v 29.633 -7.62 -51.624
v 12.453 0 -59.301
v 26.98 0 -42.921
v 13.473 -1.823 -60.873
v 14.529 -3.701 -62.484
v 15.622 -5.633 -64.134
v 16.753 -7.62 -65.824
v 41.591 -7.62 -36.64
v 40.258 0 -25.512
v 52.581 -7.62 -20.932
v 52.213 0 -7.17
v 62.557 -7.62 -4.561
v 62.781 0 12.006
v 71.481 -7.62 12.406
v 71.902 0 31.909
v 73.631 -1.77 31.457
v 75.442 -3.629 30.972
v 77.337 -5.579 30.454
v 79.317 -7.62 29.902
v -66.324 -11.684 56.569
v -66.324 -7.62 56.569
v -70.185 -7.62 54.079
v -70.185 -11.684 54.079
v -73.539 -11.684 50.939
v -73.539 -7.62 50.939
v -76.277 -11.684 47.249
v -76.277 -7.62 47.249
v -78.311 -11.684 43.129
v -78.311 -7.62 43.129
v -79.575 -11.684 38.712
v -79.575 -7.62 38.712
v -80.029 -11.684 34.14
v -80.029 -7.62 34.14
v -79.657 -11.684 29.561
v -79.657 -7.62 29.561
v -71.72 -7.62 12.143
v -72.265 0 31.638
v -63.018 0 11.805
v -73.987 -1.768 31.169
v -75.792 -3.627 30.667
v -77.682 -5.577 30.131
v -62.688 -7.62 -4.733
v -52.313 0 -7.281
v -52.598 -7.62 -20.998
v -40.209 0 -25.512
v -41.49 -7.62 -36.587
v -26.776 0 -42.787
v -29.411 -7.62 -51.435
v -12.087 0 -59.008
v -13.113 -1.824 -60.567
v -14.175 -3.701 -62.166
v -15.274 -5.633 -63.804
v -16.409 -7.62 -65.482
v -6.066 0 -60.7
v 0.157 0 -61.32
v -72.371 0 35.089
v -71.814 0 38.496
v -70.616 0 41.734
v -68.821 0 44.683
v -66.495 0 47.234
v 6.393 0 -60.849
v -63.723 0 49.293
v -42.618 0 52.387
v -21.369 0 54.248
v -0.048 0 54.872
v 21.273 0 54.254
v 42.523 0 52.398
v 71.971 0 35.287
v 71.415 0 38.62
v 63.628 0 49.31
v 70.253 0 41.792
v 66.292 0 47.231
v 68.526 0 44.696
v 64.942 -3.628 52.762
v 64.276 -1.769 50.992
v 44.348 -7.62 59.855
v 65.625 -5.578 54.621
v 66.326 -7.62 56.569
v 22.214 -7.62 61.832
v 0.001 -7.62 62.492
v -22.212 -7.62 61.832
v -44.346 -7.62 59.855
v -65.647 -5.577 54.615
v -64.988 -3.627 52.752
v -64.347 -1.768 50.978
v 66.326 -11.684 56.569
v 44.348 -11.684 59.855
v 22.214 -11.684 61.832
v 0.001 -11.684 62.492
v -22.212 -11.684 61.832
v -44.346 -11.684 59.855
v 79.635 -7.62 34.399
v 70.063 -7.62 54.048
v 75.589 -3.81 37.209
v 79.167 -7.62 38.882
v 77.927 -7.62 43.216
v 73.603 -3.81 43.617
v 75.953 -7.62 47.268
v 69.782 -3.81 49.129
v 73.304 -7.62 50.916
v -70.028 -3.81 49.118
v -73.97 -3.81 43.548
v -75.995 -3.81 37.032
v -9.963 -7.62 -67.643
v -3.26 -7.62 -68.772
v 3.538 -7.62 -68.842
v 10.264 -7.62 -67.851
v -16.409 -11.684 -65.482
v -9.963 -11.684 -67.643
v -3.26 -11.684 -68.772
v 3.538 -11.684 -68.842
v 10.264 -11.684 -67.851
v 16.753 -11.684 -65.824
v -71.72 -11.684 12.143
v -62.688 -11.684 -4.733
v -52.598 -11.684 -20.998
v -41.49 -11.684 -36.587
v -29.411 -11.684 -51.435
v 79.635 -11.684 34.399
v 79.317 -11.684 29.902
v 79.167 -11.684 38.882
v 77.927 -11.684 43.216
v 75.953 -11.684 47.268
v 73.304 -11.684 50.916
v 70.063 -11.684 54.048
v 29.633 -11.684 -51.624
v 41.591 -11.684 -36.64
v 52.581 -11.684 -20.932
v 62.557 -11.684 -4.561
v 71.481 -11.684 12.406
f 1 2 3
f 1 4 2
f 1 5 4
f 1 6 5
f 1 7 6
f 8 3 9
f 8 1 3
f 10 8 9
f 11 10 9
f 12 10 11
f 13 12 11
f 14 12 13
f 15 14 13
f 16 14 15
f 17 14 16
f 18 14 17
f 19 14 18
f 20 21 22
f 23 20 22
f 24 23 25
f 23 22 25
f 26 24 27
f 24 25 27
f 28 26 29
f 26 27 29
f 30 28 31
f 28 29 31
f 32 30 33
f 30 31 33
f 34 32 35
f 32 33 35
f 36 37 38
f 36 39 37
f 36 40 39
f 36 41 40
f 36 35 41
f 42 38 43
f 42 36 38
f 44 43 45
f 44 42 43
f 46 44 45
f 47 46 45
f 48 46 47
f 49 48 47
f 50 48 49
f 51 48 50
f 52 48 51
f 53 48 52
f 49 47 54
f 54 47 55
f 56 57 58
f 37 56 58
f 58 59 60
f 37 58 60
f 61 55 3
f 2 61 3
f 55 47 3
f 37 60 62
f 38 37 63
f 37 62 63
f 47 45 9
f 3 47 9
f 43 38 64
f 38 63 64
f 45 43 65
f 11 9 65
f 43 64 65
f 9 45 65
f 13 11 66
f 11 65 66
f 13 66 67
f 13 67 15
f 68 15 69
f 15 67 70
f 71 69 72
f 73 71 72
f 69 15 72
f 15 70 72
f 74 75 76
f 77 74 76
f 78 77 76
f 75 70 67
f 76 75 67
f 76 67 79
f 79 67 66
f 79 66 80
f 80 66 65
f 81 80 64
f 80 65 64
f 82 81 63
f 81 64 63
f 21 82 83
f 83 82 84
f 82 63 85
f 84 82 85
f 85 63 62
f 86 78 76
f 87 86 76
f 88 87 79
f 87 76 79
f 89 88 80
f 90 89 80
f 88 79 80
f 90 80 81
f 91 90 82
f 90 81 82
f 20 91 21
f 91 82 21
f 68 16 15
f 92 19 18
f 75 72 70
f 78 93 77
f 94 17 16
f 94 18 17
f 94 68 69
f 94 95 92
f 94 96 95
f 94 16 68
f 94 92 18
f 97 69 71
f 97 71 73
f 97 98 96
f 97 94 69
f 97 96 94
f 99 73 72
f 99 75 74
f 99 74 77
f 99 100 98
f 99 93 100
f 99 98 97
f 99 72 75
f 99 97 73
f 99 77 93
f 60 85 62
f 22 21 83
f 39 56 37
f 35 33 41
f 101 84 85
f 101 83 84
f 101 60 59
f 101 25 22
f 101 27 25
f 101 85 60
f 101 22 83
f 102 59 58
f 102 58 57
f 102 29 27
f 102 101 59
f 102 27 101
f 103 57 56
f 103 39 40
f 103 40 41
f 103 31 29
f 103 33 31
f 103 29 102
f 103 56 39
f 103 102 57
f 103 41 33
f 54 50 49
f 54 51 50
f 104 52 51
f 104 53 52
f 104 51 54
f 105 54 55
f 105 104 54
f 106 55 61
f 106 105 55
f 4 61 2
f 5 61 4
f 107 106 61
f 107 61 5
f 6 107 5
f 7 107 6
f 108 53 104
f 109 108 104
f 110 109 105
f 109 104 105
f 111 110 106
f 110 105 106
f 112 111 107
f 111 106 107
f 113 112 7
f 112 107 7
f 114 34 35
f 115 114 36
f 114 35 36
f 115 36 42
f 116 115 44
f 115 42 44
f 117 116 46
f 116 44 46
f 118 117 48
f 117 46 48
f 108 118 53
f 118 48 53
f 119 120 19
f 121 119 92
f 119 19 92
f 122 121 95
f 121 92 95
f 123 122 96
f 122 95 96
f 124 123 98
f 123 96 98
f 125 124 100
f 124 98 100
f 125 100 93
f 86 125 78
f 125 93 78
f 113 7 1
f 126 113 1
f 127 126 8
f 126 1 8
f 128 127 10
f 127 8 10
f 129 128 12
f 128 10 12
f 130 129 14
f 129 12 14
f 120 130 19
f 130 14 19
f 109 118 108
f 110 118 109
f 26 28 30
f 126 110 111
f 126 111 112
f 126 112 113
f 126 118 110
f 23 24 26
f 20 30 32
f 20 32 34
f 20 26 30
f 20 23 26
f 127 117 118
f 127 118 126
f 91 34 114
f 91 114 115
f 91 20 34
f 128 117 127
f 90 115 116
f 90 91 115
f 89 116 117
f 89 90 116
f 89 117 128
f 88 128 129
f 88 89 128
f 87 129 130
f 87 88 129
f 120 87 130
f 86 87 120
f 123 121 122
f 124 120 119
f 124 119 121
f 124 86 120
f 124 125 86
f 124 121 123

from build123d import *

# Parameters (mm, degrees)
F1_DEPTH   = 11.684
F2_C1_SIZE = 7.62
F2_C2_SIZE = 7.62
F2_C3_SIZE = 7.62
F2_C4_SIZE = 7.62
F2_C5_SIZE = 7.62
F2_C6_SIZE = 7.62


with BuildPart() as f1:
    # F0 (on Front) → F1 (new body)
    with BuildSketch(Plane.XZ):
        with BuildLine():
            ThreePointArc((79.3173238635, 29.9024358392), (77.0284346929, 45.2852812744), (66.3258507848, 56.569147855))
            ThreePointArc((66.3258507848, 56.569147855), (0.0009424984, 62.4915389193), (-66.3239657879, 56.569147855))
            ThreePointArc((-66.3239657879, 56.569147855), (-77.3864565896, 45.2349353182), (-79.657331109, 29.5605547726))
            ThreePointArc((-79.657331109, 29.5605547726), (-52.5977791189, -20.9983919929), (-16.4093449712, -65.4823631048))
            ThreePointArc((-16.4093449712, -65.4823631048), (0.1379989143, -68.9400736173), (16.753109172, -65.8242329955))
            ThreePointArc((16.753109172, -65.8242329955), (52.5805254234, -20.9315825649), (79.3173238635, 29.9024358392))
        make_face()
    extrude(amount=F1_DEPTH)

    # F2: chamfer of 7.62 on 6 edges, made by hand

    # F2_c1
    f2_c1_edges = [f1.edges().sort_by_distance(p)[0] for p in [
        (0.0009424984, 0, 62.4915389193),
    ]]
    chamfer(f2_c1_edges, length=F2_C1_SIZE)

    # F2_c2
    f2_c2_edges = [f1.edges().sort_by_distance(p)[0] for p in [
        (52.5805254234, 0, -20.9315825649),
    ]]
    chamfer(f2_c2_edges, length=F2_C2_SIZE)

    # F2_c3
    f2_c3_edges = [f1.edges().sort_by_distance(p)[0] for p in [
        (-52.5977791189, 0, -20.9983919929),
    ]]
    chamfer(f2_c3_edges, length=F2_C3_SIZE)

    # F2_c4
    f2_c4_edges = [f1.edges().sort_by_distance(p)[0] for p in [
        (0.4420771354, 0, -68.9421447146),
    ]]
    chamfer(f2_c4_edges, length=F2_C4_SIZE)

    # F2_c5
    f2_c5_edges = [f1.edges().sort_by_distance(p)[0] for p in [
        (-77.0468164212, 0, 45.8983976097),
    ]]
    chamfer(f2_c5_edges, length=F2_C5_SIZE)

    # F2_c6
    f2_c6_edges = [f1.edges().sort_by_distance(p)[0] for p in [
        (76.633600388, 0, 46.0621814234),
    ]]
    chamfer(f2_c6_edges, length=F2_C6_SIZE)


solid = f1.part
